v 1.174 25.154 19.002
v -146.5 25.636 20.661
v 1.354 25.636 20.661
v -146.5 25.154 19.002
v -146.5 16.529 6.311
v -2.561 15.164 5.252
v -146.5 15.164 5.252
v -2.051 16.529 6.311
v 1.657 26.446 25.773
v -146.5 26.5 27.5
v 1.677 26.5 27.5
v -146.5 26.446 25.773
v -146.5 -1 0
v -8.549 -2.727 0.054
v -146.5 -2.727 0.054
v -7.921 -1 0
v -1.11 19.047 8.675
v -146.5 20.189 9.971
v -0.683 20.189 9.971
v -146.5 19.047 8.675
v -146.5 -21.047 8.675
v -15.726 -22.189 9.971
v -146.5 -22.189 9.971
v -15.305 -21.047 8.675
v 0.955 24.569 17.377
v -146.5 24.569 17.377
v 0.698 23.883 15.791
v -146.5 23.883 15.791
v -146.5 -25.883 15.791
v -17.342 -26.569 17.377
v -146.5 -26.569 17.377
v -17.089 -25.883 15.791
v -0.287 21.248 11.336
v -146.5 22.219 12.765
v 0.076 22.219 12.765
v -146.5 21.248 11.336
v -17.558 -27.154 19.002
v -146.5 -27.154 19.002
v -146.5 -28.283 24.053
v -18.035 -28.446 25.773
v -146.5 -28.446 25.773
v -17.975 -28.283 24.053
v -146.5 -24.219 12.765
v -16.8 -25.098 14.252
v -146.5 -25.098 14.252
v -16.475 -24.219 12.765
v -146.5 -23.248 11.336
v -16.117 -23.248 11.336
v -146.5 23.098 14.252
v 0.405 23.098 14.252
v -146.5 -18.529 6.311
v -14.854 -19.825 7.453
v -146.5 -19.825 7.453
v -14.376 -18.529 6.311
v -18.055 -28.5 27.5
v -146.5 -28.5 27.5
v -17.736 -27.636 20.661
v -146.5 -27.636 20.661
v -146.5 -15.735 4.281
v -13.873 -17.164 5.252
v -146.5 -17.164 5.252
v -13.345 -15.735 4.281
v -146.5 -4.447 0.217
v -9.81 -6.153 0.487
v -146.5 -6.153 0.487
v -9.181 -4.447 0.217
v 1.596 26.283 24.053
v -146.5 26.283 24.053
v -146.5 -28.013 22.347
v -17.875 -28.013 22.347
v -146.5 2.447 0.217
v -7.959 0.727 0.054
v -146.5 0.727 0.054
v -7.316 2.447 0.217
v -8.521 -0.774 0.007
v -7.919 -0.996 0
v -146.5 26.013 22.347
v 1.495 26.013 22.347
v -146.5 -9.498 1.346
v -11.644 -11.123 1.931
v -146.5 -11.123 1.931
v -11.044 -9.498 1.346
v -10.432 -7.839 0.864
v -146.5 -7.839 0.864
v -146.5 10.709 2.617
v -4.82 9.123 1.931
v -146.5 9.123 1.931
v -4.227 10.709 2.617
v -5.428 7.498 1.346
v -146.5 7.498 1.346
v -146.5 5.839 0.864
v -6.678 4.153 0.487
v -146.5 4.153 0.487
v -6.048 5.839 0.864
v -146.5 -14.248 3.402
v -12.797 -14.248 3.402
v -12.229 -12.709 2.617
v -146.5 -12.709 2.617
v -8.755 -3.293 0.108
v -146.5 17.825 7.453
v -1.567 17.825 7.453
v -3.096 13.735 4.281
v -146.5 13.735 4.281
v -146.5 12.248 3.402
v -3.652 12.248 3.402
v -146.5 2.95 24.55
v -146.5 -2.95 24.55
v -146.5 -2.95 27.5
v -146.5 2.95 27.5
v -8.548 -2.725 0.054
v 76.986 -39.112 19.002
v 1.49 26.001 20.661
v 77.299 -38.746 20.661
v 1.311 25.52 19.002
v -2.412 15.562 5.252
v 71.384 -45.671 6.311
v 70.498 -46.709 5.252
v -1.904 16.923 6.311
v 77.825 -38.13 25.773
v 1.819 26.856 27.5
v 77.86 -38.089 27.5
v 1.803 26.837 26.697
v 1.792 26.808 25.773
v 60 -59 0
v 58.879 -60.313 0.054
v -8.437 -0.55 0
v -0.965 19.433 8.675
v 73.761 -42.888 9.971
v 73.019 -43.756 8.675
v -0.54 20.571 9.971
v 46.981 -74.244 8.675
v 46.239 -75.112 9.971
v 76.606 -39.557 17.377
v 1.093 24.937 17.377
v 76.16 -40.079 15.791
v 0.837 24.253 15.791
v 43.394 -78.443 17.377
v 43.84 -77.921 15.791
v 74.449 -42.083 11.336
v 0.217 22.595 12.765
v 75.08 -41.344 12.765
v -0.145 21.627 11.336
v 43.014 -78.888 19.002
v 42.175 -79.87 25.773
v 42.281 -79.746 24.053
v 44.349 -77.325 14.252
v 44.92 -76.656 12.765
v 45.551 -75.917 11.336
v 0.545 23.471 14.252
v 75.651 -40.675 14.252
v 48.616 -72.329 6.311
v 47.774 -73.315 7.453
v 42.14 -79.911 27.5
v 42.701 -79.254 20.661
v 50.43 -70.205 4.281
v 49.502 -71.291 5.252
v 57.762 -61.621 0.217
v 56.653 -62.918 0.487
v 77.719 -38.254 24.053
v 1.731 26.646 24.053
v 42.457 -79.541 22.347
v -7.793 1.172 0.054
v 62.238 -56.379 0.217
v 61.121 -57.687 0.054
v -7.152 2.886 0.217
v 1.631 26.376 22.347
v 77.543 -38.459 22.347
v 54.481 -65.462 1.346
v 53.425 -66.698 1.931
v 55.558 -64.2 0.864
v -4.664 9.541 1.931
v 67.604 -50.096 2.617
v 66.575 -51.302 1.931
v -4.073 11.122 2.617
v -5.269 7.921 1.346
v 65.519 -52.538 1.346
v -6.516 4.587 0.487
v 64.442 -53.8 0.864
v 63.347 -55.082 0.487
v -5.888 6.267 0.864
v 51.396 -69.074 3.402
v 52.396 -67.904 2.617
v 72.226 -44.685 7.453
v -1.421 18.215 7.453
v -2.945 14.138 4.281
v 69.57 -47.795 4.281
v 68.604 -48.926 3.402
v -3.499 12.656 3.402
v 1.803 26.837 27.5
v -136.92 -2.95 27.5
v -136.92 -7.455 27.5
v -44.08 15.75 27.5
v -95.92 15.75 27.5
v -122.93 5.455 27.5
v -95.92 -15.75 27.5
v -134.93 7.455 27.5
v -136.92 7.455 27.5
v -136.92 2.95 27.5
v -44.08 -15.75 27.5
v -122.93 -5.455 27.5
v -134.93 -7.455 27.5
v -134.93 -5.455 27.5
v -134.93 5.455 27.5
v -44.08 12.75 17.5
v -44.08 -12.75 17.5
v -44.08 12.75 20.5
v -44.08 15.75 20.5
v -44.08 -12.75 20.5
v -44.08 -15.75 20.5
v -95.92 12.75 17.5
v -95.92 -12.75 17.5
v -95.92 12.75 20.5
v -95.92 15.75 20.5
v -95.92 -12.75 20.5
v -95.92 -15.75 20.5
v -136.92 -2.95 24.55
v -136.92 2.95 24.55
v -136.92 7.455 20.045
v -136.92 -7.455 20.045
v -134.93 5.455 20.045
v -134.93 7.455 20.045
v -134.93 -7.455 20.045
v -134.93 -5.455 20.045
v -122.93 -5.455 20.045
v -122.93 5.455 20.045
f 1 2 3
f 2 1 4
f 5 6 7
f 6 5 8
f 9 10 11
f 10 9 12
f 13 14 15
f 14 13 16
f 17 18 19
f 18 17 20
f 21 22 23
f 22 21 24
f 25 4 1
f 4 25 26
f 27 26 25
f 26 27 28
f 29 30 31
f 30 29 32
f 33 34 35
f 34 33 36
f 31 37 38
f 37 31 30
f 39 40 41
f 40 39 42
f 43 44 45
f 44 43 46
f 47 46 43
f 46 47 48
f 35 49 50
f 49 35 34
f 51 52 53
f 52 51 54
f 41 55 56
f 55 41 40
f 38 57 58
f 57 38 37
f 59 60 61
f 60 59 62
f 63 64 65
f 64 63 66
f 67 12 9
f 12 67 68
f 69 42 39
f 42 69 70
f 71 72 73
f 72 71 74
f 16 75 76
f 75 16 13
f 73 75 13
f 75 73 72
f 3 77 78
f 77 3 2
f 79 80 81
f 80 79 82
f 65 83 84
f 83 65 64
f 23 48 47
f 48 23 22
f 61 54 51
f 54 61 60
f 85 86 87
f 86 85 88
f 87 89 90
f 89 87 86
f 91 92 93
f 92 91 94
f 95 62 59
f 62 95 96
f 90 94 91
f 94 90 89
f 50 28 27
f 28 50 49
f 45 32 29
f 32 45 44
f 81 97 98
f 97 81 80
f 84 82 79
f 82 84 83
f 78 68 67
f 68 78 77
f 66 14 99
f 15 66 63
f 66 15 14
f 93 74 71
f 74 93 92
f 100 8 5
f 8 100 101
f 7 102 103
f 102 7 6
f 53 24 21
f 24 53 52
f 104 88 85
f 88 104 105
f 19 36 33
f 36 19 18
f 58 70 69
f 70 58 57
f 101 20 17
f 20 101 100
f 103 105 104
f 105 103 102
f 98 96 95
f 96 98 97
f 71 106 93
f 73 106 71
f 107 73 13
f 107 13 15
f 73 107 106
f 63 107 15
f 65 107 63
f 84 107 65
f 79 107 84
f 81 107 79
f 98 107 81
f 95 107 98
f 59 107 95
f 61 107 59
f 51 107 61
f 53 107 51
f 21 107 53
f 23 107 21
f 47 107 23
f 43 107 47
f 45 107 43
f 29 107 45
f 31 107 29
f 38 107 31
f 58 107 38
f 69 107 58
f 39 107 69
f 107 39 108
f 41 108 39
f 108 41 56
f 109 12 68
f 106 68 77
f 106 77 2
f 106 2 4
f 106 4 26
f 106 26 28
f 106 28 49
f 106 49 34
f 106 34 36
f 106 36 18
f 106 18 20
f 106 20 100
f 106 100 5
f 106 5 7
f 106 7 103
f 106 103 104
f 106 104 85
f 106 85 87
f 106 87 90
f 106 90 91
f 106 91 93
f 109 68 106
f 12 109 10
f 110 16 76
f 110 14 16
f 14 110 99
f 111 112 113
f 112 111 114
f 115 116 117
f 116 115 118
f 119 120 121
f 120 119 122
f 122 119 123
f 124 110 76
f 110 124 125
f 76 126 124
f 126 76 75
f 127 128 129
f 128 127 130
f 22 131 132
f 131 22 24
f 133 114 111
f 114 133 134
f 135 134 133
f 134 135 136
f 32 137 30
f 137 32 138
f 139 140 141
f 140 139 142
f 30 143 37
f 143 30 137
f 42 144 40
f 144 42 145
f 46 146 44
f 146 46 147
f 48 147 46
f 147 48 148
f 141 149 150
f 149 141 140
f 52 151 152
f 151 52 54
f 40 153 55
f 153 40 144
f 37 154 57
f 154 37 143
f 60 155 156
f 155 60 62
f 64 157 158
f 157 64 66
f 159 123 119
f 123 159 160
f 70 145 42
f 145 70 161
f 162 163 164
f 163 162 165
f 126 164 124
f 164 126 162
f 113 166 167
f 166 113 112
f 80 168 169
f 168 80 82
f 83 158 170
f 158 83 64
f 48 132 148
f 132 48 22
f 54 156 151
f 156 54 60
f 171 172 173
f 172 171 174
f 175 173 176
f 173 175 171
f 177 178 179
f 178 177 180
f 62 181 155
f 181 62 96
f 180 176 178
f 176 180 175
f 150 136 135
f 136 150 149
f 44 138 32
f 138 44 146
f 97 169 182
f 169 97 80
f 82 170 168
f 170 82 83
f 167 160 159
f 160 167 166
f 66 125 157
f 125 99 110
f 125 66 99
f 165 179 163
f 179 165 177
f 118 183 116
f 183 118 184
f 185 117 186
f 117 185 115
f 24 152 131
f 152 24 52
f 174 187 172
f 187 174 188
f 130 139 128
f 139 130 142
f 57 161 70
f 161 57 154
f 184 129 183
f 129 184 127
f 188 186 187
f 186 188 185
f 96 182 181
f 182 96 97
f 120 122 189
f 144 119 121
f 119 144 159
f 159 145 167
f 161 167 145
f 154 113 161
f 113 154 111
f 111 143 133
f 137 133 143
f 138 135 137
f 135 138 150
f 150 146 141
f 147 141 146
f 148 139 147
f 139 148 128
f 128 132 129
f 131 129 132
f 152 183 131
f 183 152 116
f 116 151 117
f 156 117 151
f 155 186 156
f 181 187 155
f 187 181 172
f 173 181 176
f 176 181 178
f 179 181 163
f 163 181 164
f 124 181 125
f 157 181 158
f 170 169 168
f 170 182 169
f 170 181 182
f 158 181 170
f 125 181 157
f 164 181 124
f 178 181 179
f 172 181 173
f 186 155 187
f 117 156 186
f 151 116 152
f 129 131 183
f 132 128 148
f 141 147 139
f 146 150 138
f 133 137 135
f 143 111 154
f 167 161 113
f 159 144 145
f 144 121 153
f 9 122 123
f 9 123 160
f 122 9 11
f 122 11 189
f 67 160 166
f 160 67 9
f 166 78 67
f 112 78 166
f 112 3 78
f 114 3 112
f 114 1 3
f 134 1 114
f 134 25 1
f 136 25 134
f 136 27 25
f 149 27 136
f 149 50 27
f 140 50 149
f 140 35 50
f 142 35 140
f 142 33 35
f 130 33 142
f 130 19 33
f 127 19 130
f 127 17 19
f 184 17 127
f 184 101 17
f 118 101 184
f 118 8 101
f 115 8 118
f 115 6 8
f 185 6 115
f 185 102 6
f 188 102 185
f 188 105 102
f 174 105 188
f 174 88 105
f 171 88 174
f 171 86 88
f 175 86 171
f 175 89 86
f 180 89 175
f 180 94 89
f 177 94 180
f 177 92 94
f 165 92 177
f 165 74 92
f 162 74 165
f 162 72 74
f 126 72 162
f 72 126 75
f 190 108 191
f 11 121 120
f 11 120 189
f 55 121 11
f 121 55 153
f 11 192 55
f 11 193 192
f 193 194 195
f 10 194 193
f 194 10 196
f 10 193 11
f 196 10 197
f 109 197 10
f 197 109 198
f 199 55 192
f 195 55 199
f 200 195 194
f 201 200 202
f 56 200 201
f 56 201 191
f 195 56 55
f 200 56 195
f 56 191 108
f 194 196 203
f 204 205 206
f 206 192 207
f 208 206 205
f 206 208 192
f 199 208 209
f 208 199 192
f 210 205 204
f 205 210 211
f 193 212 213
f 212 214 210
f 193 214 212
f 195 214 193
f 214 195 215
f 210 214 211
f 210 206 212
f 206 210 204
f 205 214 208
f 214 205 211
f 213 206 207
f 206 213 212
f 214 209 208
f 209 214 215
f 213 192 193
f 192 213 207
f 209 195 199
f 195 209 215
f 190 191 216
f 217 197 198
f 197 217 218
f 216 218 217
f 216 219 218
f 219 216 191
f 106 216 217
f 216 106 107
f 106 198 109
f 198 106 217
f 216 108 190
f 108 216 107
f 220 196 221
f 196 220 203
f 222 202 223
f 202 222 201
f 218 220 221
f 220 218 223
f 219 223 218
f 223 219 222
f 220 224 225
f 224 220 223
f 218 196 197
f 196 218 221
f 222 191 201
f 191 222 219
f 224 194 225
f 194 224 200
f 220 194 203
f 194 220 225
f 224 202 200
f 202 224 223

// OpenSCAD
// file: ledCutout.scad
include<variables.scad>
use <base_modules.scad>


module ledCutout(offset = [0, 0, 0], rotation = [0, 0, 0]){
    compRegionW = 12;
    compRegionL = ledBrdL - 4;
    translate(offset) rotate(rotation){
        
        
        translate([ledHousingW/2, 0, -ledHousingD/2])
            solid_block([ledHousingW, ledHousingD, ledHousingD]); 
        
        translate([ledBrdW/2 + ledHousingW, 0, -ledBrdH/2])
            solid_block([ledBrdW, ledBrdL, ledBrdH]);
        
        translate([ledHousingW + ledBrdW + (compRegionW/2), 0, -ledBrdH/2])
            solid_block([compRegionW, compRegionL, ledBrdH]);

        
    }
}
// file: controlCutout.scad
include<variables.scad>
use <base_modules.scad>


module ctlrCutout(offset = [0, 0, 0], rotation = [0, 0, 0]){
    ctlrRegionL = microCtlrHousingL - 6;
    legH = 3;
    brdT = circBrdT + 0.4;
    
    
    translate(offset) rotate(rotation){
        
        
        solid_block([microCtlrHousingW, ctlrRegionL, microCtlrHousingH]);
        
        translate([0, 0, legH]){
            solid_block([microCtlrHousingW, microCtlrHousingL, brdT]);
        }
        
        
    }
}

module ctlrCutoutV2(offset = [0, 0, 0], rotation = [0, 0, 0]){
    ctlrRegionL = microCtlrHousingL - 6;
    legH = 3;
    brdT = circBrdT + 0.4;
    
    
    translate(offset) rotate(rotation){
        
        
        solid_block([microCtlrHousingW, ctlrRegionL, microCtlrHousingH]);
        
        translate([0, 0, legH]){
            solid_block([microCtlrHousingW, microCtlrHousingL, microCtlrHousingH - legH]);
        }
        
        
    }
}
// file: variables.scad
circBrdT = 1.59; //exact
circBrdSolderSpace = 3;
ledBrdW = circBrdT + 0.4;
ledBrdL = 14.91;
ledBrdH = 14.91;
ledHousingD = 5.5 + 0.4;
ledHousingW = 9.58; 
microCtlrHousingW = 50.84 + 1; 
microCtlrHousingL = 30.5 + 1; 
microCtlrHousingH = 19 + 1; 
switchHousingW = 22.44 + 1; 
switchHousingL = 38.03 + 1;
switchHousingH = 10.13 + 1; 
cnvrtrHousingW = 7.04 + 0.4; 
cnvrtrHousingL = 37.15 + 1; 
cnvrtrHousingH = 17.15 + 0.6; 
batteryHousingW = 18.05; 
batteryHousingL = 66.91; 
batteryHousingH = 18.05; 
sideT = 2;
gunPieceBotH = 20;
gunPieceNozzleW = 55;
gunPieceNozzleL = 150;
gunPieceHandleW = 55;
gunPieceHandleL = 100;
batteryContactsW = 23.94 + 0.4;
batteryContactsH = circBrdT + 0.4;
// file: base_modules.scad
//dimensions = [number of edges, distance from corner to center, height]
module n_edged_block(dimensions) {
    n = dimensions[0];
    r = dimensions[1];
    height = dimensions[2];
    angles = [ for (i = [0:n-1]) i*(360/n) ];
    coords = [ for (th=angles) [r*cos(th), r*sin(th)] ];
    linear_extrude(height, convexity = 10)
        polygon(coords);
}

//dimensions = [lower diameter, upper diameter, height]
module solid_cylinder(dimensions) {
    translate([0, 0, dimensions[2]/2])
        cylinder(dimensions[2], d1= dimensions[0], d2 = dimensions[1], center = true, $fn = 100);
}

//dimensions = [diameter of cylinder, elongation from center, height]
module elongated_cylinder(dimensions) {
    radius = dimensions[0]/2;
    for (i = [-1 : 2 : 1]) translate([i * dimensions[1]/2, 0, 0])
        cylinder(dimensions[2], radius, radius, $fn=100);
    #solid_block([dimensions[1], dimensions[0], dimensions[2]]);
}

//dimensions = [width(x), length(y), height(z)]
module solid_block(dimensions) {
    translate([0, 0, dimensions[2]/2])
        cube(dimensions, true);
}

//dimensions = [width(x), length(y), height(z)]
//chamferWidth = width of cut on bottom corners
module solid_block_chamferred(dimensions, chamferWidth = 0) {
    difference() {
        solid_block(dimensions);
        for (i = [0 : 1]) {
            translate([(i%2)*(dimensions[0]-chamferWidth)/2, (1-i%2)*(dimensions[1]-chamferWidth)/2, chamferWidth/2])
            rotate([-135*(1-i%2), 135*(i%2), 0])
                solid_block(
                            [(1-i%2)*dimensions[0] + (i%2)*chamferWidth*2, 
                             (i%2)*dimensions[1] + (1-i%2)*chamferWidth*2, 
                             chamferWidth]);
            translate([-(i%2)*(dimensions[0]-chamferWidth)/2, -(1-i%2)*(dimensions[1]-chamferWidth)/2, chamferWidth/2])
            rotate([135*(1-i%2), -135*(i%2), 0])
                solid_block(
                            [(1-i%2)*dimensions[0] + (i%2)*chamferWidth*2, 
                             (i%2)*dimensions[1] + (1-i%2)*chamferWidth*2, 
                             chamferWidth]);
        }
    }
}

//mainly used for subtration
//dimensions = [width(x), length(y)]
//chamferWidth = height and extra width that is meant to be subtracted
module inner_chamferring(dimensions, chamferWidth = 0) {
    dimensions = [dimensions[0]+chamferWidth*2, dimensions[1]+chamferWidth*2, chamferWidth];
    difference() {
        solid_block(dimensions);
        for (i = [0 : 1]) {
            translate([(i%2)*(dimensions[0]-chamferWidth)/2, (1-i%2)*(dimensions[1]-chamferWidth)/2, chamferWidth/2])
            rotate([-45*(1-i%2), 45*(i%2), 0])
                solid_block(
                            [(1-i%2)*dimensions[0] + (i%2)*chamferWidth*2, 
                             (i%2)*dimensions[1] + (1-i%2)*chamferWidth*2, 
                             chamferWidth]);
            translate([-(i%2)*(dimensions[0]-chamferWidth)/2, -(1-i%2)*(dimensions[1]-chamferWidth)/2, chamferWidth/2])
            rotate([45*(1-i%2), -45*(i%2), 0])
                solid_block(
                            [(1-i%2)*dimensions[0] + (i%2)*chamferWidth*2, 
                             (i%2)*dimensions[1] + (1-i%2)*chamferWidth*2, 
                             chamferWidth]);
        }
    }
}

//for bigger modules, copy and paste and replace __format__ with the name of the module you are creating
module _format_(shift = [0, 0, 0], rotation = [0, 0, 0]) {
    translate(shift) { rotate(rotation) {
    
    
    
    
    
    }}
}
// main file
use <base_modules.scad>
include<variables.scad>
use <controlCutout.scad>
use <ledCutout.scad>

gun_bottom();

module gun_bottom() {
    difference() {
        intersection() {
            translate([0, 0, gunPieceNozzleW/2]) rotate([0, 180, 0]) {
                body();
                handle();
            }
            solid_block([300, 200, gunPieceNozzleW/2]);
        }
        ctlrCutoutV2([-70, 0, gunPieceNozzleW/2 - microCtlrHousingH/2]);
        ledCutout([-gunPieceNozzleL + 3.5, 0, gunPieceNozzleW/2]);
    }
}

module body(){
    translate([-3.5, -1, 0]){
        
    rotate([0, 90, 0])
        difference(){
                    solid_cylinder([gunPieceNozzleW, gunPieceNozzleW, gunPieceNozzleL]);
                    translate([-5, -6 ,-13]) rotate([-20, 0, 0])
                        solid_block([gunPieceHandleW+10, gunPieceHandleW +10, 25]);
            
                }
     }
}

module handle(){
    translate([-60, -59, 0]){
        rotate([0, 90, 40.5])
            difference(){
                solid_cylinder([gunPieceHandleW, gunPieceHandleW, gunPieceHandleL]);
                translate([0, 0 ,gunPieceHandleL-10]) rotate([20, 0, 0])
                    solid_block([gunPieceHandleW+5, gunPieceHandleW +5, 20]);
            
            }
    }
 }
    
